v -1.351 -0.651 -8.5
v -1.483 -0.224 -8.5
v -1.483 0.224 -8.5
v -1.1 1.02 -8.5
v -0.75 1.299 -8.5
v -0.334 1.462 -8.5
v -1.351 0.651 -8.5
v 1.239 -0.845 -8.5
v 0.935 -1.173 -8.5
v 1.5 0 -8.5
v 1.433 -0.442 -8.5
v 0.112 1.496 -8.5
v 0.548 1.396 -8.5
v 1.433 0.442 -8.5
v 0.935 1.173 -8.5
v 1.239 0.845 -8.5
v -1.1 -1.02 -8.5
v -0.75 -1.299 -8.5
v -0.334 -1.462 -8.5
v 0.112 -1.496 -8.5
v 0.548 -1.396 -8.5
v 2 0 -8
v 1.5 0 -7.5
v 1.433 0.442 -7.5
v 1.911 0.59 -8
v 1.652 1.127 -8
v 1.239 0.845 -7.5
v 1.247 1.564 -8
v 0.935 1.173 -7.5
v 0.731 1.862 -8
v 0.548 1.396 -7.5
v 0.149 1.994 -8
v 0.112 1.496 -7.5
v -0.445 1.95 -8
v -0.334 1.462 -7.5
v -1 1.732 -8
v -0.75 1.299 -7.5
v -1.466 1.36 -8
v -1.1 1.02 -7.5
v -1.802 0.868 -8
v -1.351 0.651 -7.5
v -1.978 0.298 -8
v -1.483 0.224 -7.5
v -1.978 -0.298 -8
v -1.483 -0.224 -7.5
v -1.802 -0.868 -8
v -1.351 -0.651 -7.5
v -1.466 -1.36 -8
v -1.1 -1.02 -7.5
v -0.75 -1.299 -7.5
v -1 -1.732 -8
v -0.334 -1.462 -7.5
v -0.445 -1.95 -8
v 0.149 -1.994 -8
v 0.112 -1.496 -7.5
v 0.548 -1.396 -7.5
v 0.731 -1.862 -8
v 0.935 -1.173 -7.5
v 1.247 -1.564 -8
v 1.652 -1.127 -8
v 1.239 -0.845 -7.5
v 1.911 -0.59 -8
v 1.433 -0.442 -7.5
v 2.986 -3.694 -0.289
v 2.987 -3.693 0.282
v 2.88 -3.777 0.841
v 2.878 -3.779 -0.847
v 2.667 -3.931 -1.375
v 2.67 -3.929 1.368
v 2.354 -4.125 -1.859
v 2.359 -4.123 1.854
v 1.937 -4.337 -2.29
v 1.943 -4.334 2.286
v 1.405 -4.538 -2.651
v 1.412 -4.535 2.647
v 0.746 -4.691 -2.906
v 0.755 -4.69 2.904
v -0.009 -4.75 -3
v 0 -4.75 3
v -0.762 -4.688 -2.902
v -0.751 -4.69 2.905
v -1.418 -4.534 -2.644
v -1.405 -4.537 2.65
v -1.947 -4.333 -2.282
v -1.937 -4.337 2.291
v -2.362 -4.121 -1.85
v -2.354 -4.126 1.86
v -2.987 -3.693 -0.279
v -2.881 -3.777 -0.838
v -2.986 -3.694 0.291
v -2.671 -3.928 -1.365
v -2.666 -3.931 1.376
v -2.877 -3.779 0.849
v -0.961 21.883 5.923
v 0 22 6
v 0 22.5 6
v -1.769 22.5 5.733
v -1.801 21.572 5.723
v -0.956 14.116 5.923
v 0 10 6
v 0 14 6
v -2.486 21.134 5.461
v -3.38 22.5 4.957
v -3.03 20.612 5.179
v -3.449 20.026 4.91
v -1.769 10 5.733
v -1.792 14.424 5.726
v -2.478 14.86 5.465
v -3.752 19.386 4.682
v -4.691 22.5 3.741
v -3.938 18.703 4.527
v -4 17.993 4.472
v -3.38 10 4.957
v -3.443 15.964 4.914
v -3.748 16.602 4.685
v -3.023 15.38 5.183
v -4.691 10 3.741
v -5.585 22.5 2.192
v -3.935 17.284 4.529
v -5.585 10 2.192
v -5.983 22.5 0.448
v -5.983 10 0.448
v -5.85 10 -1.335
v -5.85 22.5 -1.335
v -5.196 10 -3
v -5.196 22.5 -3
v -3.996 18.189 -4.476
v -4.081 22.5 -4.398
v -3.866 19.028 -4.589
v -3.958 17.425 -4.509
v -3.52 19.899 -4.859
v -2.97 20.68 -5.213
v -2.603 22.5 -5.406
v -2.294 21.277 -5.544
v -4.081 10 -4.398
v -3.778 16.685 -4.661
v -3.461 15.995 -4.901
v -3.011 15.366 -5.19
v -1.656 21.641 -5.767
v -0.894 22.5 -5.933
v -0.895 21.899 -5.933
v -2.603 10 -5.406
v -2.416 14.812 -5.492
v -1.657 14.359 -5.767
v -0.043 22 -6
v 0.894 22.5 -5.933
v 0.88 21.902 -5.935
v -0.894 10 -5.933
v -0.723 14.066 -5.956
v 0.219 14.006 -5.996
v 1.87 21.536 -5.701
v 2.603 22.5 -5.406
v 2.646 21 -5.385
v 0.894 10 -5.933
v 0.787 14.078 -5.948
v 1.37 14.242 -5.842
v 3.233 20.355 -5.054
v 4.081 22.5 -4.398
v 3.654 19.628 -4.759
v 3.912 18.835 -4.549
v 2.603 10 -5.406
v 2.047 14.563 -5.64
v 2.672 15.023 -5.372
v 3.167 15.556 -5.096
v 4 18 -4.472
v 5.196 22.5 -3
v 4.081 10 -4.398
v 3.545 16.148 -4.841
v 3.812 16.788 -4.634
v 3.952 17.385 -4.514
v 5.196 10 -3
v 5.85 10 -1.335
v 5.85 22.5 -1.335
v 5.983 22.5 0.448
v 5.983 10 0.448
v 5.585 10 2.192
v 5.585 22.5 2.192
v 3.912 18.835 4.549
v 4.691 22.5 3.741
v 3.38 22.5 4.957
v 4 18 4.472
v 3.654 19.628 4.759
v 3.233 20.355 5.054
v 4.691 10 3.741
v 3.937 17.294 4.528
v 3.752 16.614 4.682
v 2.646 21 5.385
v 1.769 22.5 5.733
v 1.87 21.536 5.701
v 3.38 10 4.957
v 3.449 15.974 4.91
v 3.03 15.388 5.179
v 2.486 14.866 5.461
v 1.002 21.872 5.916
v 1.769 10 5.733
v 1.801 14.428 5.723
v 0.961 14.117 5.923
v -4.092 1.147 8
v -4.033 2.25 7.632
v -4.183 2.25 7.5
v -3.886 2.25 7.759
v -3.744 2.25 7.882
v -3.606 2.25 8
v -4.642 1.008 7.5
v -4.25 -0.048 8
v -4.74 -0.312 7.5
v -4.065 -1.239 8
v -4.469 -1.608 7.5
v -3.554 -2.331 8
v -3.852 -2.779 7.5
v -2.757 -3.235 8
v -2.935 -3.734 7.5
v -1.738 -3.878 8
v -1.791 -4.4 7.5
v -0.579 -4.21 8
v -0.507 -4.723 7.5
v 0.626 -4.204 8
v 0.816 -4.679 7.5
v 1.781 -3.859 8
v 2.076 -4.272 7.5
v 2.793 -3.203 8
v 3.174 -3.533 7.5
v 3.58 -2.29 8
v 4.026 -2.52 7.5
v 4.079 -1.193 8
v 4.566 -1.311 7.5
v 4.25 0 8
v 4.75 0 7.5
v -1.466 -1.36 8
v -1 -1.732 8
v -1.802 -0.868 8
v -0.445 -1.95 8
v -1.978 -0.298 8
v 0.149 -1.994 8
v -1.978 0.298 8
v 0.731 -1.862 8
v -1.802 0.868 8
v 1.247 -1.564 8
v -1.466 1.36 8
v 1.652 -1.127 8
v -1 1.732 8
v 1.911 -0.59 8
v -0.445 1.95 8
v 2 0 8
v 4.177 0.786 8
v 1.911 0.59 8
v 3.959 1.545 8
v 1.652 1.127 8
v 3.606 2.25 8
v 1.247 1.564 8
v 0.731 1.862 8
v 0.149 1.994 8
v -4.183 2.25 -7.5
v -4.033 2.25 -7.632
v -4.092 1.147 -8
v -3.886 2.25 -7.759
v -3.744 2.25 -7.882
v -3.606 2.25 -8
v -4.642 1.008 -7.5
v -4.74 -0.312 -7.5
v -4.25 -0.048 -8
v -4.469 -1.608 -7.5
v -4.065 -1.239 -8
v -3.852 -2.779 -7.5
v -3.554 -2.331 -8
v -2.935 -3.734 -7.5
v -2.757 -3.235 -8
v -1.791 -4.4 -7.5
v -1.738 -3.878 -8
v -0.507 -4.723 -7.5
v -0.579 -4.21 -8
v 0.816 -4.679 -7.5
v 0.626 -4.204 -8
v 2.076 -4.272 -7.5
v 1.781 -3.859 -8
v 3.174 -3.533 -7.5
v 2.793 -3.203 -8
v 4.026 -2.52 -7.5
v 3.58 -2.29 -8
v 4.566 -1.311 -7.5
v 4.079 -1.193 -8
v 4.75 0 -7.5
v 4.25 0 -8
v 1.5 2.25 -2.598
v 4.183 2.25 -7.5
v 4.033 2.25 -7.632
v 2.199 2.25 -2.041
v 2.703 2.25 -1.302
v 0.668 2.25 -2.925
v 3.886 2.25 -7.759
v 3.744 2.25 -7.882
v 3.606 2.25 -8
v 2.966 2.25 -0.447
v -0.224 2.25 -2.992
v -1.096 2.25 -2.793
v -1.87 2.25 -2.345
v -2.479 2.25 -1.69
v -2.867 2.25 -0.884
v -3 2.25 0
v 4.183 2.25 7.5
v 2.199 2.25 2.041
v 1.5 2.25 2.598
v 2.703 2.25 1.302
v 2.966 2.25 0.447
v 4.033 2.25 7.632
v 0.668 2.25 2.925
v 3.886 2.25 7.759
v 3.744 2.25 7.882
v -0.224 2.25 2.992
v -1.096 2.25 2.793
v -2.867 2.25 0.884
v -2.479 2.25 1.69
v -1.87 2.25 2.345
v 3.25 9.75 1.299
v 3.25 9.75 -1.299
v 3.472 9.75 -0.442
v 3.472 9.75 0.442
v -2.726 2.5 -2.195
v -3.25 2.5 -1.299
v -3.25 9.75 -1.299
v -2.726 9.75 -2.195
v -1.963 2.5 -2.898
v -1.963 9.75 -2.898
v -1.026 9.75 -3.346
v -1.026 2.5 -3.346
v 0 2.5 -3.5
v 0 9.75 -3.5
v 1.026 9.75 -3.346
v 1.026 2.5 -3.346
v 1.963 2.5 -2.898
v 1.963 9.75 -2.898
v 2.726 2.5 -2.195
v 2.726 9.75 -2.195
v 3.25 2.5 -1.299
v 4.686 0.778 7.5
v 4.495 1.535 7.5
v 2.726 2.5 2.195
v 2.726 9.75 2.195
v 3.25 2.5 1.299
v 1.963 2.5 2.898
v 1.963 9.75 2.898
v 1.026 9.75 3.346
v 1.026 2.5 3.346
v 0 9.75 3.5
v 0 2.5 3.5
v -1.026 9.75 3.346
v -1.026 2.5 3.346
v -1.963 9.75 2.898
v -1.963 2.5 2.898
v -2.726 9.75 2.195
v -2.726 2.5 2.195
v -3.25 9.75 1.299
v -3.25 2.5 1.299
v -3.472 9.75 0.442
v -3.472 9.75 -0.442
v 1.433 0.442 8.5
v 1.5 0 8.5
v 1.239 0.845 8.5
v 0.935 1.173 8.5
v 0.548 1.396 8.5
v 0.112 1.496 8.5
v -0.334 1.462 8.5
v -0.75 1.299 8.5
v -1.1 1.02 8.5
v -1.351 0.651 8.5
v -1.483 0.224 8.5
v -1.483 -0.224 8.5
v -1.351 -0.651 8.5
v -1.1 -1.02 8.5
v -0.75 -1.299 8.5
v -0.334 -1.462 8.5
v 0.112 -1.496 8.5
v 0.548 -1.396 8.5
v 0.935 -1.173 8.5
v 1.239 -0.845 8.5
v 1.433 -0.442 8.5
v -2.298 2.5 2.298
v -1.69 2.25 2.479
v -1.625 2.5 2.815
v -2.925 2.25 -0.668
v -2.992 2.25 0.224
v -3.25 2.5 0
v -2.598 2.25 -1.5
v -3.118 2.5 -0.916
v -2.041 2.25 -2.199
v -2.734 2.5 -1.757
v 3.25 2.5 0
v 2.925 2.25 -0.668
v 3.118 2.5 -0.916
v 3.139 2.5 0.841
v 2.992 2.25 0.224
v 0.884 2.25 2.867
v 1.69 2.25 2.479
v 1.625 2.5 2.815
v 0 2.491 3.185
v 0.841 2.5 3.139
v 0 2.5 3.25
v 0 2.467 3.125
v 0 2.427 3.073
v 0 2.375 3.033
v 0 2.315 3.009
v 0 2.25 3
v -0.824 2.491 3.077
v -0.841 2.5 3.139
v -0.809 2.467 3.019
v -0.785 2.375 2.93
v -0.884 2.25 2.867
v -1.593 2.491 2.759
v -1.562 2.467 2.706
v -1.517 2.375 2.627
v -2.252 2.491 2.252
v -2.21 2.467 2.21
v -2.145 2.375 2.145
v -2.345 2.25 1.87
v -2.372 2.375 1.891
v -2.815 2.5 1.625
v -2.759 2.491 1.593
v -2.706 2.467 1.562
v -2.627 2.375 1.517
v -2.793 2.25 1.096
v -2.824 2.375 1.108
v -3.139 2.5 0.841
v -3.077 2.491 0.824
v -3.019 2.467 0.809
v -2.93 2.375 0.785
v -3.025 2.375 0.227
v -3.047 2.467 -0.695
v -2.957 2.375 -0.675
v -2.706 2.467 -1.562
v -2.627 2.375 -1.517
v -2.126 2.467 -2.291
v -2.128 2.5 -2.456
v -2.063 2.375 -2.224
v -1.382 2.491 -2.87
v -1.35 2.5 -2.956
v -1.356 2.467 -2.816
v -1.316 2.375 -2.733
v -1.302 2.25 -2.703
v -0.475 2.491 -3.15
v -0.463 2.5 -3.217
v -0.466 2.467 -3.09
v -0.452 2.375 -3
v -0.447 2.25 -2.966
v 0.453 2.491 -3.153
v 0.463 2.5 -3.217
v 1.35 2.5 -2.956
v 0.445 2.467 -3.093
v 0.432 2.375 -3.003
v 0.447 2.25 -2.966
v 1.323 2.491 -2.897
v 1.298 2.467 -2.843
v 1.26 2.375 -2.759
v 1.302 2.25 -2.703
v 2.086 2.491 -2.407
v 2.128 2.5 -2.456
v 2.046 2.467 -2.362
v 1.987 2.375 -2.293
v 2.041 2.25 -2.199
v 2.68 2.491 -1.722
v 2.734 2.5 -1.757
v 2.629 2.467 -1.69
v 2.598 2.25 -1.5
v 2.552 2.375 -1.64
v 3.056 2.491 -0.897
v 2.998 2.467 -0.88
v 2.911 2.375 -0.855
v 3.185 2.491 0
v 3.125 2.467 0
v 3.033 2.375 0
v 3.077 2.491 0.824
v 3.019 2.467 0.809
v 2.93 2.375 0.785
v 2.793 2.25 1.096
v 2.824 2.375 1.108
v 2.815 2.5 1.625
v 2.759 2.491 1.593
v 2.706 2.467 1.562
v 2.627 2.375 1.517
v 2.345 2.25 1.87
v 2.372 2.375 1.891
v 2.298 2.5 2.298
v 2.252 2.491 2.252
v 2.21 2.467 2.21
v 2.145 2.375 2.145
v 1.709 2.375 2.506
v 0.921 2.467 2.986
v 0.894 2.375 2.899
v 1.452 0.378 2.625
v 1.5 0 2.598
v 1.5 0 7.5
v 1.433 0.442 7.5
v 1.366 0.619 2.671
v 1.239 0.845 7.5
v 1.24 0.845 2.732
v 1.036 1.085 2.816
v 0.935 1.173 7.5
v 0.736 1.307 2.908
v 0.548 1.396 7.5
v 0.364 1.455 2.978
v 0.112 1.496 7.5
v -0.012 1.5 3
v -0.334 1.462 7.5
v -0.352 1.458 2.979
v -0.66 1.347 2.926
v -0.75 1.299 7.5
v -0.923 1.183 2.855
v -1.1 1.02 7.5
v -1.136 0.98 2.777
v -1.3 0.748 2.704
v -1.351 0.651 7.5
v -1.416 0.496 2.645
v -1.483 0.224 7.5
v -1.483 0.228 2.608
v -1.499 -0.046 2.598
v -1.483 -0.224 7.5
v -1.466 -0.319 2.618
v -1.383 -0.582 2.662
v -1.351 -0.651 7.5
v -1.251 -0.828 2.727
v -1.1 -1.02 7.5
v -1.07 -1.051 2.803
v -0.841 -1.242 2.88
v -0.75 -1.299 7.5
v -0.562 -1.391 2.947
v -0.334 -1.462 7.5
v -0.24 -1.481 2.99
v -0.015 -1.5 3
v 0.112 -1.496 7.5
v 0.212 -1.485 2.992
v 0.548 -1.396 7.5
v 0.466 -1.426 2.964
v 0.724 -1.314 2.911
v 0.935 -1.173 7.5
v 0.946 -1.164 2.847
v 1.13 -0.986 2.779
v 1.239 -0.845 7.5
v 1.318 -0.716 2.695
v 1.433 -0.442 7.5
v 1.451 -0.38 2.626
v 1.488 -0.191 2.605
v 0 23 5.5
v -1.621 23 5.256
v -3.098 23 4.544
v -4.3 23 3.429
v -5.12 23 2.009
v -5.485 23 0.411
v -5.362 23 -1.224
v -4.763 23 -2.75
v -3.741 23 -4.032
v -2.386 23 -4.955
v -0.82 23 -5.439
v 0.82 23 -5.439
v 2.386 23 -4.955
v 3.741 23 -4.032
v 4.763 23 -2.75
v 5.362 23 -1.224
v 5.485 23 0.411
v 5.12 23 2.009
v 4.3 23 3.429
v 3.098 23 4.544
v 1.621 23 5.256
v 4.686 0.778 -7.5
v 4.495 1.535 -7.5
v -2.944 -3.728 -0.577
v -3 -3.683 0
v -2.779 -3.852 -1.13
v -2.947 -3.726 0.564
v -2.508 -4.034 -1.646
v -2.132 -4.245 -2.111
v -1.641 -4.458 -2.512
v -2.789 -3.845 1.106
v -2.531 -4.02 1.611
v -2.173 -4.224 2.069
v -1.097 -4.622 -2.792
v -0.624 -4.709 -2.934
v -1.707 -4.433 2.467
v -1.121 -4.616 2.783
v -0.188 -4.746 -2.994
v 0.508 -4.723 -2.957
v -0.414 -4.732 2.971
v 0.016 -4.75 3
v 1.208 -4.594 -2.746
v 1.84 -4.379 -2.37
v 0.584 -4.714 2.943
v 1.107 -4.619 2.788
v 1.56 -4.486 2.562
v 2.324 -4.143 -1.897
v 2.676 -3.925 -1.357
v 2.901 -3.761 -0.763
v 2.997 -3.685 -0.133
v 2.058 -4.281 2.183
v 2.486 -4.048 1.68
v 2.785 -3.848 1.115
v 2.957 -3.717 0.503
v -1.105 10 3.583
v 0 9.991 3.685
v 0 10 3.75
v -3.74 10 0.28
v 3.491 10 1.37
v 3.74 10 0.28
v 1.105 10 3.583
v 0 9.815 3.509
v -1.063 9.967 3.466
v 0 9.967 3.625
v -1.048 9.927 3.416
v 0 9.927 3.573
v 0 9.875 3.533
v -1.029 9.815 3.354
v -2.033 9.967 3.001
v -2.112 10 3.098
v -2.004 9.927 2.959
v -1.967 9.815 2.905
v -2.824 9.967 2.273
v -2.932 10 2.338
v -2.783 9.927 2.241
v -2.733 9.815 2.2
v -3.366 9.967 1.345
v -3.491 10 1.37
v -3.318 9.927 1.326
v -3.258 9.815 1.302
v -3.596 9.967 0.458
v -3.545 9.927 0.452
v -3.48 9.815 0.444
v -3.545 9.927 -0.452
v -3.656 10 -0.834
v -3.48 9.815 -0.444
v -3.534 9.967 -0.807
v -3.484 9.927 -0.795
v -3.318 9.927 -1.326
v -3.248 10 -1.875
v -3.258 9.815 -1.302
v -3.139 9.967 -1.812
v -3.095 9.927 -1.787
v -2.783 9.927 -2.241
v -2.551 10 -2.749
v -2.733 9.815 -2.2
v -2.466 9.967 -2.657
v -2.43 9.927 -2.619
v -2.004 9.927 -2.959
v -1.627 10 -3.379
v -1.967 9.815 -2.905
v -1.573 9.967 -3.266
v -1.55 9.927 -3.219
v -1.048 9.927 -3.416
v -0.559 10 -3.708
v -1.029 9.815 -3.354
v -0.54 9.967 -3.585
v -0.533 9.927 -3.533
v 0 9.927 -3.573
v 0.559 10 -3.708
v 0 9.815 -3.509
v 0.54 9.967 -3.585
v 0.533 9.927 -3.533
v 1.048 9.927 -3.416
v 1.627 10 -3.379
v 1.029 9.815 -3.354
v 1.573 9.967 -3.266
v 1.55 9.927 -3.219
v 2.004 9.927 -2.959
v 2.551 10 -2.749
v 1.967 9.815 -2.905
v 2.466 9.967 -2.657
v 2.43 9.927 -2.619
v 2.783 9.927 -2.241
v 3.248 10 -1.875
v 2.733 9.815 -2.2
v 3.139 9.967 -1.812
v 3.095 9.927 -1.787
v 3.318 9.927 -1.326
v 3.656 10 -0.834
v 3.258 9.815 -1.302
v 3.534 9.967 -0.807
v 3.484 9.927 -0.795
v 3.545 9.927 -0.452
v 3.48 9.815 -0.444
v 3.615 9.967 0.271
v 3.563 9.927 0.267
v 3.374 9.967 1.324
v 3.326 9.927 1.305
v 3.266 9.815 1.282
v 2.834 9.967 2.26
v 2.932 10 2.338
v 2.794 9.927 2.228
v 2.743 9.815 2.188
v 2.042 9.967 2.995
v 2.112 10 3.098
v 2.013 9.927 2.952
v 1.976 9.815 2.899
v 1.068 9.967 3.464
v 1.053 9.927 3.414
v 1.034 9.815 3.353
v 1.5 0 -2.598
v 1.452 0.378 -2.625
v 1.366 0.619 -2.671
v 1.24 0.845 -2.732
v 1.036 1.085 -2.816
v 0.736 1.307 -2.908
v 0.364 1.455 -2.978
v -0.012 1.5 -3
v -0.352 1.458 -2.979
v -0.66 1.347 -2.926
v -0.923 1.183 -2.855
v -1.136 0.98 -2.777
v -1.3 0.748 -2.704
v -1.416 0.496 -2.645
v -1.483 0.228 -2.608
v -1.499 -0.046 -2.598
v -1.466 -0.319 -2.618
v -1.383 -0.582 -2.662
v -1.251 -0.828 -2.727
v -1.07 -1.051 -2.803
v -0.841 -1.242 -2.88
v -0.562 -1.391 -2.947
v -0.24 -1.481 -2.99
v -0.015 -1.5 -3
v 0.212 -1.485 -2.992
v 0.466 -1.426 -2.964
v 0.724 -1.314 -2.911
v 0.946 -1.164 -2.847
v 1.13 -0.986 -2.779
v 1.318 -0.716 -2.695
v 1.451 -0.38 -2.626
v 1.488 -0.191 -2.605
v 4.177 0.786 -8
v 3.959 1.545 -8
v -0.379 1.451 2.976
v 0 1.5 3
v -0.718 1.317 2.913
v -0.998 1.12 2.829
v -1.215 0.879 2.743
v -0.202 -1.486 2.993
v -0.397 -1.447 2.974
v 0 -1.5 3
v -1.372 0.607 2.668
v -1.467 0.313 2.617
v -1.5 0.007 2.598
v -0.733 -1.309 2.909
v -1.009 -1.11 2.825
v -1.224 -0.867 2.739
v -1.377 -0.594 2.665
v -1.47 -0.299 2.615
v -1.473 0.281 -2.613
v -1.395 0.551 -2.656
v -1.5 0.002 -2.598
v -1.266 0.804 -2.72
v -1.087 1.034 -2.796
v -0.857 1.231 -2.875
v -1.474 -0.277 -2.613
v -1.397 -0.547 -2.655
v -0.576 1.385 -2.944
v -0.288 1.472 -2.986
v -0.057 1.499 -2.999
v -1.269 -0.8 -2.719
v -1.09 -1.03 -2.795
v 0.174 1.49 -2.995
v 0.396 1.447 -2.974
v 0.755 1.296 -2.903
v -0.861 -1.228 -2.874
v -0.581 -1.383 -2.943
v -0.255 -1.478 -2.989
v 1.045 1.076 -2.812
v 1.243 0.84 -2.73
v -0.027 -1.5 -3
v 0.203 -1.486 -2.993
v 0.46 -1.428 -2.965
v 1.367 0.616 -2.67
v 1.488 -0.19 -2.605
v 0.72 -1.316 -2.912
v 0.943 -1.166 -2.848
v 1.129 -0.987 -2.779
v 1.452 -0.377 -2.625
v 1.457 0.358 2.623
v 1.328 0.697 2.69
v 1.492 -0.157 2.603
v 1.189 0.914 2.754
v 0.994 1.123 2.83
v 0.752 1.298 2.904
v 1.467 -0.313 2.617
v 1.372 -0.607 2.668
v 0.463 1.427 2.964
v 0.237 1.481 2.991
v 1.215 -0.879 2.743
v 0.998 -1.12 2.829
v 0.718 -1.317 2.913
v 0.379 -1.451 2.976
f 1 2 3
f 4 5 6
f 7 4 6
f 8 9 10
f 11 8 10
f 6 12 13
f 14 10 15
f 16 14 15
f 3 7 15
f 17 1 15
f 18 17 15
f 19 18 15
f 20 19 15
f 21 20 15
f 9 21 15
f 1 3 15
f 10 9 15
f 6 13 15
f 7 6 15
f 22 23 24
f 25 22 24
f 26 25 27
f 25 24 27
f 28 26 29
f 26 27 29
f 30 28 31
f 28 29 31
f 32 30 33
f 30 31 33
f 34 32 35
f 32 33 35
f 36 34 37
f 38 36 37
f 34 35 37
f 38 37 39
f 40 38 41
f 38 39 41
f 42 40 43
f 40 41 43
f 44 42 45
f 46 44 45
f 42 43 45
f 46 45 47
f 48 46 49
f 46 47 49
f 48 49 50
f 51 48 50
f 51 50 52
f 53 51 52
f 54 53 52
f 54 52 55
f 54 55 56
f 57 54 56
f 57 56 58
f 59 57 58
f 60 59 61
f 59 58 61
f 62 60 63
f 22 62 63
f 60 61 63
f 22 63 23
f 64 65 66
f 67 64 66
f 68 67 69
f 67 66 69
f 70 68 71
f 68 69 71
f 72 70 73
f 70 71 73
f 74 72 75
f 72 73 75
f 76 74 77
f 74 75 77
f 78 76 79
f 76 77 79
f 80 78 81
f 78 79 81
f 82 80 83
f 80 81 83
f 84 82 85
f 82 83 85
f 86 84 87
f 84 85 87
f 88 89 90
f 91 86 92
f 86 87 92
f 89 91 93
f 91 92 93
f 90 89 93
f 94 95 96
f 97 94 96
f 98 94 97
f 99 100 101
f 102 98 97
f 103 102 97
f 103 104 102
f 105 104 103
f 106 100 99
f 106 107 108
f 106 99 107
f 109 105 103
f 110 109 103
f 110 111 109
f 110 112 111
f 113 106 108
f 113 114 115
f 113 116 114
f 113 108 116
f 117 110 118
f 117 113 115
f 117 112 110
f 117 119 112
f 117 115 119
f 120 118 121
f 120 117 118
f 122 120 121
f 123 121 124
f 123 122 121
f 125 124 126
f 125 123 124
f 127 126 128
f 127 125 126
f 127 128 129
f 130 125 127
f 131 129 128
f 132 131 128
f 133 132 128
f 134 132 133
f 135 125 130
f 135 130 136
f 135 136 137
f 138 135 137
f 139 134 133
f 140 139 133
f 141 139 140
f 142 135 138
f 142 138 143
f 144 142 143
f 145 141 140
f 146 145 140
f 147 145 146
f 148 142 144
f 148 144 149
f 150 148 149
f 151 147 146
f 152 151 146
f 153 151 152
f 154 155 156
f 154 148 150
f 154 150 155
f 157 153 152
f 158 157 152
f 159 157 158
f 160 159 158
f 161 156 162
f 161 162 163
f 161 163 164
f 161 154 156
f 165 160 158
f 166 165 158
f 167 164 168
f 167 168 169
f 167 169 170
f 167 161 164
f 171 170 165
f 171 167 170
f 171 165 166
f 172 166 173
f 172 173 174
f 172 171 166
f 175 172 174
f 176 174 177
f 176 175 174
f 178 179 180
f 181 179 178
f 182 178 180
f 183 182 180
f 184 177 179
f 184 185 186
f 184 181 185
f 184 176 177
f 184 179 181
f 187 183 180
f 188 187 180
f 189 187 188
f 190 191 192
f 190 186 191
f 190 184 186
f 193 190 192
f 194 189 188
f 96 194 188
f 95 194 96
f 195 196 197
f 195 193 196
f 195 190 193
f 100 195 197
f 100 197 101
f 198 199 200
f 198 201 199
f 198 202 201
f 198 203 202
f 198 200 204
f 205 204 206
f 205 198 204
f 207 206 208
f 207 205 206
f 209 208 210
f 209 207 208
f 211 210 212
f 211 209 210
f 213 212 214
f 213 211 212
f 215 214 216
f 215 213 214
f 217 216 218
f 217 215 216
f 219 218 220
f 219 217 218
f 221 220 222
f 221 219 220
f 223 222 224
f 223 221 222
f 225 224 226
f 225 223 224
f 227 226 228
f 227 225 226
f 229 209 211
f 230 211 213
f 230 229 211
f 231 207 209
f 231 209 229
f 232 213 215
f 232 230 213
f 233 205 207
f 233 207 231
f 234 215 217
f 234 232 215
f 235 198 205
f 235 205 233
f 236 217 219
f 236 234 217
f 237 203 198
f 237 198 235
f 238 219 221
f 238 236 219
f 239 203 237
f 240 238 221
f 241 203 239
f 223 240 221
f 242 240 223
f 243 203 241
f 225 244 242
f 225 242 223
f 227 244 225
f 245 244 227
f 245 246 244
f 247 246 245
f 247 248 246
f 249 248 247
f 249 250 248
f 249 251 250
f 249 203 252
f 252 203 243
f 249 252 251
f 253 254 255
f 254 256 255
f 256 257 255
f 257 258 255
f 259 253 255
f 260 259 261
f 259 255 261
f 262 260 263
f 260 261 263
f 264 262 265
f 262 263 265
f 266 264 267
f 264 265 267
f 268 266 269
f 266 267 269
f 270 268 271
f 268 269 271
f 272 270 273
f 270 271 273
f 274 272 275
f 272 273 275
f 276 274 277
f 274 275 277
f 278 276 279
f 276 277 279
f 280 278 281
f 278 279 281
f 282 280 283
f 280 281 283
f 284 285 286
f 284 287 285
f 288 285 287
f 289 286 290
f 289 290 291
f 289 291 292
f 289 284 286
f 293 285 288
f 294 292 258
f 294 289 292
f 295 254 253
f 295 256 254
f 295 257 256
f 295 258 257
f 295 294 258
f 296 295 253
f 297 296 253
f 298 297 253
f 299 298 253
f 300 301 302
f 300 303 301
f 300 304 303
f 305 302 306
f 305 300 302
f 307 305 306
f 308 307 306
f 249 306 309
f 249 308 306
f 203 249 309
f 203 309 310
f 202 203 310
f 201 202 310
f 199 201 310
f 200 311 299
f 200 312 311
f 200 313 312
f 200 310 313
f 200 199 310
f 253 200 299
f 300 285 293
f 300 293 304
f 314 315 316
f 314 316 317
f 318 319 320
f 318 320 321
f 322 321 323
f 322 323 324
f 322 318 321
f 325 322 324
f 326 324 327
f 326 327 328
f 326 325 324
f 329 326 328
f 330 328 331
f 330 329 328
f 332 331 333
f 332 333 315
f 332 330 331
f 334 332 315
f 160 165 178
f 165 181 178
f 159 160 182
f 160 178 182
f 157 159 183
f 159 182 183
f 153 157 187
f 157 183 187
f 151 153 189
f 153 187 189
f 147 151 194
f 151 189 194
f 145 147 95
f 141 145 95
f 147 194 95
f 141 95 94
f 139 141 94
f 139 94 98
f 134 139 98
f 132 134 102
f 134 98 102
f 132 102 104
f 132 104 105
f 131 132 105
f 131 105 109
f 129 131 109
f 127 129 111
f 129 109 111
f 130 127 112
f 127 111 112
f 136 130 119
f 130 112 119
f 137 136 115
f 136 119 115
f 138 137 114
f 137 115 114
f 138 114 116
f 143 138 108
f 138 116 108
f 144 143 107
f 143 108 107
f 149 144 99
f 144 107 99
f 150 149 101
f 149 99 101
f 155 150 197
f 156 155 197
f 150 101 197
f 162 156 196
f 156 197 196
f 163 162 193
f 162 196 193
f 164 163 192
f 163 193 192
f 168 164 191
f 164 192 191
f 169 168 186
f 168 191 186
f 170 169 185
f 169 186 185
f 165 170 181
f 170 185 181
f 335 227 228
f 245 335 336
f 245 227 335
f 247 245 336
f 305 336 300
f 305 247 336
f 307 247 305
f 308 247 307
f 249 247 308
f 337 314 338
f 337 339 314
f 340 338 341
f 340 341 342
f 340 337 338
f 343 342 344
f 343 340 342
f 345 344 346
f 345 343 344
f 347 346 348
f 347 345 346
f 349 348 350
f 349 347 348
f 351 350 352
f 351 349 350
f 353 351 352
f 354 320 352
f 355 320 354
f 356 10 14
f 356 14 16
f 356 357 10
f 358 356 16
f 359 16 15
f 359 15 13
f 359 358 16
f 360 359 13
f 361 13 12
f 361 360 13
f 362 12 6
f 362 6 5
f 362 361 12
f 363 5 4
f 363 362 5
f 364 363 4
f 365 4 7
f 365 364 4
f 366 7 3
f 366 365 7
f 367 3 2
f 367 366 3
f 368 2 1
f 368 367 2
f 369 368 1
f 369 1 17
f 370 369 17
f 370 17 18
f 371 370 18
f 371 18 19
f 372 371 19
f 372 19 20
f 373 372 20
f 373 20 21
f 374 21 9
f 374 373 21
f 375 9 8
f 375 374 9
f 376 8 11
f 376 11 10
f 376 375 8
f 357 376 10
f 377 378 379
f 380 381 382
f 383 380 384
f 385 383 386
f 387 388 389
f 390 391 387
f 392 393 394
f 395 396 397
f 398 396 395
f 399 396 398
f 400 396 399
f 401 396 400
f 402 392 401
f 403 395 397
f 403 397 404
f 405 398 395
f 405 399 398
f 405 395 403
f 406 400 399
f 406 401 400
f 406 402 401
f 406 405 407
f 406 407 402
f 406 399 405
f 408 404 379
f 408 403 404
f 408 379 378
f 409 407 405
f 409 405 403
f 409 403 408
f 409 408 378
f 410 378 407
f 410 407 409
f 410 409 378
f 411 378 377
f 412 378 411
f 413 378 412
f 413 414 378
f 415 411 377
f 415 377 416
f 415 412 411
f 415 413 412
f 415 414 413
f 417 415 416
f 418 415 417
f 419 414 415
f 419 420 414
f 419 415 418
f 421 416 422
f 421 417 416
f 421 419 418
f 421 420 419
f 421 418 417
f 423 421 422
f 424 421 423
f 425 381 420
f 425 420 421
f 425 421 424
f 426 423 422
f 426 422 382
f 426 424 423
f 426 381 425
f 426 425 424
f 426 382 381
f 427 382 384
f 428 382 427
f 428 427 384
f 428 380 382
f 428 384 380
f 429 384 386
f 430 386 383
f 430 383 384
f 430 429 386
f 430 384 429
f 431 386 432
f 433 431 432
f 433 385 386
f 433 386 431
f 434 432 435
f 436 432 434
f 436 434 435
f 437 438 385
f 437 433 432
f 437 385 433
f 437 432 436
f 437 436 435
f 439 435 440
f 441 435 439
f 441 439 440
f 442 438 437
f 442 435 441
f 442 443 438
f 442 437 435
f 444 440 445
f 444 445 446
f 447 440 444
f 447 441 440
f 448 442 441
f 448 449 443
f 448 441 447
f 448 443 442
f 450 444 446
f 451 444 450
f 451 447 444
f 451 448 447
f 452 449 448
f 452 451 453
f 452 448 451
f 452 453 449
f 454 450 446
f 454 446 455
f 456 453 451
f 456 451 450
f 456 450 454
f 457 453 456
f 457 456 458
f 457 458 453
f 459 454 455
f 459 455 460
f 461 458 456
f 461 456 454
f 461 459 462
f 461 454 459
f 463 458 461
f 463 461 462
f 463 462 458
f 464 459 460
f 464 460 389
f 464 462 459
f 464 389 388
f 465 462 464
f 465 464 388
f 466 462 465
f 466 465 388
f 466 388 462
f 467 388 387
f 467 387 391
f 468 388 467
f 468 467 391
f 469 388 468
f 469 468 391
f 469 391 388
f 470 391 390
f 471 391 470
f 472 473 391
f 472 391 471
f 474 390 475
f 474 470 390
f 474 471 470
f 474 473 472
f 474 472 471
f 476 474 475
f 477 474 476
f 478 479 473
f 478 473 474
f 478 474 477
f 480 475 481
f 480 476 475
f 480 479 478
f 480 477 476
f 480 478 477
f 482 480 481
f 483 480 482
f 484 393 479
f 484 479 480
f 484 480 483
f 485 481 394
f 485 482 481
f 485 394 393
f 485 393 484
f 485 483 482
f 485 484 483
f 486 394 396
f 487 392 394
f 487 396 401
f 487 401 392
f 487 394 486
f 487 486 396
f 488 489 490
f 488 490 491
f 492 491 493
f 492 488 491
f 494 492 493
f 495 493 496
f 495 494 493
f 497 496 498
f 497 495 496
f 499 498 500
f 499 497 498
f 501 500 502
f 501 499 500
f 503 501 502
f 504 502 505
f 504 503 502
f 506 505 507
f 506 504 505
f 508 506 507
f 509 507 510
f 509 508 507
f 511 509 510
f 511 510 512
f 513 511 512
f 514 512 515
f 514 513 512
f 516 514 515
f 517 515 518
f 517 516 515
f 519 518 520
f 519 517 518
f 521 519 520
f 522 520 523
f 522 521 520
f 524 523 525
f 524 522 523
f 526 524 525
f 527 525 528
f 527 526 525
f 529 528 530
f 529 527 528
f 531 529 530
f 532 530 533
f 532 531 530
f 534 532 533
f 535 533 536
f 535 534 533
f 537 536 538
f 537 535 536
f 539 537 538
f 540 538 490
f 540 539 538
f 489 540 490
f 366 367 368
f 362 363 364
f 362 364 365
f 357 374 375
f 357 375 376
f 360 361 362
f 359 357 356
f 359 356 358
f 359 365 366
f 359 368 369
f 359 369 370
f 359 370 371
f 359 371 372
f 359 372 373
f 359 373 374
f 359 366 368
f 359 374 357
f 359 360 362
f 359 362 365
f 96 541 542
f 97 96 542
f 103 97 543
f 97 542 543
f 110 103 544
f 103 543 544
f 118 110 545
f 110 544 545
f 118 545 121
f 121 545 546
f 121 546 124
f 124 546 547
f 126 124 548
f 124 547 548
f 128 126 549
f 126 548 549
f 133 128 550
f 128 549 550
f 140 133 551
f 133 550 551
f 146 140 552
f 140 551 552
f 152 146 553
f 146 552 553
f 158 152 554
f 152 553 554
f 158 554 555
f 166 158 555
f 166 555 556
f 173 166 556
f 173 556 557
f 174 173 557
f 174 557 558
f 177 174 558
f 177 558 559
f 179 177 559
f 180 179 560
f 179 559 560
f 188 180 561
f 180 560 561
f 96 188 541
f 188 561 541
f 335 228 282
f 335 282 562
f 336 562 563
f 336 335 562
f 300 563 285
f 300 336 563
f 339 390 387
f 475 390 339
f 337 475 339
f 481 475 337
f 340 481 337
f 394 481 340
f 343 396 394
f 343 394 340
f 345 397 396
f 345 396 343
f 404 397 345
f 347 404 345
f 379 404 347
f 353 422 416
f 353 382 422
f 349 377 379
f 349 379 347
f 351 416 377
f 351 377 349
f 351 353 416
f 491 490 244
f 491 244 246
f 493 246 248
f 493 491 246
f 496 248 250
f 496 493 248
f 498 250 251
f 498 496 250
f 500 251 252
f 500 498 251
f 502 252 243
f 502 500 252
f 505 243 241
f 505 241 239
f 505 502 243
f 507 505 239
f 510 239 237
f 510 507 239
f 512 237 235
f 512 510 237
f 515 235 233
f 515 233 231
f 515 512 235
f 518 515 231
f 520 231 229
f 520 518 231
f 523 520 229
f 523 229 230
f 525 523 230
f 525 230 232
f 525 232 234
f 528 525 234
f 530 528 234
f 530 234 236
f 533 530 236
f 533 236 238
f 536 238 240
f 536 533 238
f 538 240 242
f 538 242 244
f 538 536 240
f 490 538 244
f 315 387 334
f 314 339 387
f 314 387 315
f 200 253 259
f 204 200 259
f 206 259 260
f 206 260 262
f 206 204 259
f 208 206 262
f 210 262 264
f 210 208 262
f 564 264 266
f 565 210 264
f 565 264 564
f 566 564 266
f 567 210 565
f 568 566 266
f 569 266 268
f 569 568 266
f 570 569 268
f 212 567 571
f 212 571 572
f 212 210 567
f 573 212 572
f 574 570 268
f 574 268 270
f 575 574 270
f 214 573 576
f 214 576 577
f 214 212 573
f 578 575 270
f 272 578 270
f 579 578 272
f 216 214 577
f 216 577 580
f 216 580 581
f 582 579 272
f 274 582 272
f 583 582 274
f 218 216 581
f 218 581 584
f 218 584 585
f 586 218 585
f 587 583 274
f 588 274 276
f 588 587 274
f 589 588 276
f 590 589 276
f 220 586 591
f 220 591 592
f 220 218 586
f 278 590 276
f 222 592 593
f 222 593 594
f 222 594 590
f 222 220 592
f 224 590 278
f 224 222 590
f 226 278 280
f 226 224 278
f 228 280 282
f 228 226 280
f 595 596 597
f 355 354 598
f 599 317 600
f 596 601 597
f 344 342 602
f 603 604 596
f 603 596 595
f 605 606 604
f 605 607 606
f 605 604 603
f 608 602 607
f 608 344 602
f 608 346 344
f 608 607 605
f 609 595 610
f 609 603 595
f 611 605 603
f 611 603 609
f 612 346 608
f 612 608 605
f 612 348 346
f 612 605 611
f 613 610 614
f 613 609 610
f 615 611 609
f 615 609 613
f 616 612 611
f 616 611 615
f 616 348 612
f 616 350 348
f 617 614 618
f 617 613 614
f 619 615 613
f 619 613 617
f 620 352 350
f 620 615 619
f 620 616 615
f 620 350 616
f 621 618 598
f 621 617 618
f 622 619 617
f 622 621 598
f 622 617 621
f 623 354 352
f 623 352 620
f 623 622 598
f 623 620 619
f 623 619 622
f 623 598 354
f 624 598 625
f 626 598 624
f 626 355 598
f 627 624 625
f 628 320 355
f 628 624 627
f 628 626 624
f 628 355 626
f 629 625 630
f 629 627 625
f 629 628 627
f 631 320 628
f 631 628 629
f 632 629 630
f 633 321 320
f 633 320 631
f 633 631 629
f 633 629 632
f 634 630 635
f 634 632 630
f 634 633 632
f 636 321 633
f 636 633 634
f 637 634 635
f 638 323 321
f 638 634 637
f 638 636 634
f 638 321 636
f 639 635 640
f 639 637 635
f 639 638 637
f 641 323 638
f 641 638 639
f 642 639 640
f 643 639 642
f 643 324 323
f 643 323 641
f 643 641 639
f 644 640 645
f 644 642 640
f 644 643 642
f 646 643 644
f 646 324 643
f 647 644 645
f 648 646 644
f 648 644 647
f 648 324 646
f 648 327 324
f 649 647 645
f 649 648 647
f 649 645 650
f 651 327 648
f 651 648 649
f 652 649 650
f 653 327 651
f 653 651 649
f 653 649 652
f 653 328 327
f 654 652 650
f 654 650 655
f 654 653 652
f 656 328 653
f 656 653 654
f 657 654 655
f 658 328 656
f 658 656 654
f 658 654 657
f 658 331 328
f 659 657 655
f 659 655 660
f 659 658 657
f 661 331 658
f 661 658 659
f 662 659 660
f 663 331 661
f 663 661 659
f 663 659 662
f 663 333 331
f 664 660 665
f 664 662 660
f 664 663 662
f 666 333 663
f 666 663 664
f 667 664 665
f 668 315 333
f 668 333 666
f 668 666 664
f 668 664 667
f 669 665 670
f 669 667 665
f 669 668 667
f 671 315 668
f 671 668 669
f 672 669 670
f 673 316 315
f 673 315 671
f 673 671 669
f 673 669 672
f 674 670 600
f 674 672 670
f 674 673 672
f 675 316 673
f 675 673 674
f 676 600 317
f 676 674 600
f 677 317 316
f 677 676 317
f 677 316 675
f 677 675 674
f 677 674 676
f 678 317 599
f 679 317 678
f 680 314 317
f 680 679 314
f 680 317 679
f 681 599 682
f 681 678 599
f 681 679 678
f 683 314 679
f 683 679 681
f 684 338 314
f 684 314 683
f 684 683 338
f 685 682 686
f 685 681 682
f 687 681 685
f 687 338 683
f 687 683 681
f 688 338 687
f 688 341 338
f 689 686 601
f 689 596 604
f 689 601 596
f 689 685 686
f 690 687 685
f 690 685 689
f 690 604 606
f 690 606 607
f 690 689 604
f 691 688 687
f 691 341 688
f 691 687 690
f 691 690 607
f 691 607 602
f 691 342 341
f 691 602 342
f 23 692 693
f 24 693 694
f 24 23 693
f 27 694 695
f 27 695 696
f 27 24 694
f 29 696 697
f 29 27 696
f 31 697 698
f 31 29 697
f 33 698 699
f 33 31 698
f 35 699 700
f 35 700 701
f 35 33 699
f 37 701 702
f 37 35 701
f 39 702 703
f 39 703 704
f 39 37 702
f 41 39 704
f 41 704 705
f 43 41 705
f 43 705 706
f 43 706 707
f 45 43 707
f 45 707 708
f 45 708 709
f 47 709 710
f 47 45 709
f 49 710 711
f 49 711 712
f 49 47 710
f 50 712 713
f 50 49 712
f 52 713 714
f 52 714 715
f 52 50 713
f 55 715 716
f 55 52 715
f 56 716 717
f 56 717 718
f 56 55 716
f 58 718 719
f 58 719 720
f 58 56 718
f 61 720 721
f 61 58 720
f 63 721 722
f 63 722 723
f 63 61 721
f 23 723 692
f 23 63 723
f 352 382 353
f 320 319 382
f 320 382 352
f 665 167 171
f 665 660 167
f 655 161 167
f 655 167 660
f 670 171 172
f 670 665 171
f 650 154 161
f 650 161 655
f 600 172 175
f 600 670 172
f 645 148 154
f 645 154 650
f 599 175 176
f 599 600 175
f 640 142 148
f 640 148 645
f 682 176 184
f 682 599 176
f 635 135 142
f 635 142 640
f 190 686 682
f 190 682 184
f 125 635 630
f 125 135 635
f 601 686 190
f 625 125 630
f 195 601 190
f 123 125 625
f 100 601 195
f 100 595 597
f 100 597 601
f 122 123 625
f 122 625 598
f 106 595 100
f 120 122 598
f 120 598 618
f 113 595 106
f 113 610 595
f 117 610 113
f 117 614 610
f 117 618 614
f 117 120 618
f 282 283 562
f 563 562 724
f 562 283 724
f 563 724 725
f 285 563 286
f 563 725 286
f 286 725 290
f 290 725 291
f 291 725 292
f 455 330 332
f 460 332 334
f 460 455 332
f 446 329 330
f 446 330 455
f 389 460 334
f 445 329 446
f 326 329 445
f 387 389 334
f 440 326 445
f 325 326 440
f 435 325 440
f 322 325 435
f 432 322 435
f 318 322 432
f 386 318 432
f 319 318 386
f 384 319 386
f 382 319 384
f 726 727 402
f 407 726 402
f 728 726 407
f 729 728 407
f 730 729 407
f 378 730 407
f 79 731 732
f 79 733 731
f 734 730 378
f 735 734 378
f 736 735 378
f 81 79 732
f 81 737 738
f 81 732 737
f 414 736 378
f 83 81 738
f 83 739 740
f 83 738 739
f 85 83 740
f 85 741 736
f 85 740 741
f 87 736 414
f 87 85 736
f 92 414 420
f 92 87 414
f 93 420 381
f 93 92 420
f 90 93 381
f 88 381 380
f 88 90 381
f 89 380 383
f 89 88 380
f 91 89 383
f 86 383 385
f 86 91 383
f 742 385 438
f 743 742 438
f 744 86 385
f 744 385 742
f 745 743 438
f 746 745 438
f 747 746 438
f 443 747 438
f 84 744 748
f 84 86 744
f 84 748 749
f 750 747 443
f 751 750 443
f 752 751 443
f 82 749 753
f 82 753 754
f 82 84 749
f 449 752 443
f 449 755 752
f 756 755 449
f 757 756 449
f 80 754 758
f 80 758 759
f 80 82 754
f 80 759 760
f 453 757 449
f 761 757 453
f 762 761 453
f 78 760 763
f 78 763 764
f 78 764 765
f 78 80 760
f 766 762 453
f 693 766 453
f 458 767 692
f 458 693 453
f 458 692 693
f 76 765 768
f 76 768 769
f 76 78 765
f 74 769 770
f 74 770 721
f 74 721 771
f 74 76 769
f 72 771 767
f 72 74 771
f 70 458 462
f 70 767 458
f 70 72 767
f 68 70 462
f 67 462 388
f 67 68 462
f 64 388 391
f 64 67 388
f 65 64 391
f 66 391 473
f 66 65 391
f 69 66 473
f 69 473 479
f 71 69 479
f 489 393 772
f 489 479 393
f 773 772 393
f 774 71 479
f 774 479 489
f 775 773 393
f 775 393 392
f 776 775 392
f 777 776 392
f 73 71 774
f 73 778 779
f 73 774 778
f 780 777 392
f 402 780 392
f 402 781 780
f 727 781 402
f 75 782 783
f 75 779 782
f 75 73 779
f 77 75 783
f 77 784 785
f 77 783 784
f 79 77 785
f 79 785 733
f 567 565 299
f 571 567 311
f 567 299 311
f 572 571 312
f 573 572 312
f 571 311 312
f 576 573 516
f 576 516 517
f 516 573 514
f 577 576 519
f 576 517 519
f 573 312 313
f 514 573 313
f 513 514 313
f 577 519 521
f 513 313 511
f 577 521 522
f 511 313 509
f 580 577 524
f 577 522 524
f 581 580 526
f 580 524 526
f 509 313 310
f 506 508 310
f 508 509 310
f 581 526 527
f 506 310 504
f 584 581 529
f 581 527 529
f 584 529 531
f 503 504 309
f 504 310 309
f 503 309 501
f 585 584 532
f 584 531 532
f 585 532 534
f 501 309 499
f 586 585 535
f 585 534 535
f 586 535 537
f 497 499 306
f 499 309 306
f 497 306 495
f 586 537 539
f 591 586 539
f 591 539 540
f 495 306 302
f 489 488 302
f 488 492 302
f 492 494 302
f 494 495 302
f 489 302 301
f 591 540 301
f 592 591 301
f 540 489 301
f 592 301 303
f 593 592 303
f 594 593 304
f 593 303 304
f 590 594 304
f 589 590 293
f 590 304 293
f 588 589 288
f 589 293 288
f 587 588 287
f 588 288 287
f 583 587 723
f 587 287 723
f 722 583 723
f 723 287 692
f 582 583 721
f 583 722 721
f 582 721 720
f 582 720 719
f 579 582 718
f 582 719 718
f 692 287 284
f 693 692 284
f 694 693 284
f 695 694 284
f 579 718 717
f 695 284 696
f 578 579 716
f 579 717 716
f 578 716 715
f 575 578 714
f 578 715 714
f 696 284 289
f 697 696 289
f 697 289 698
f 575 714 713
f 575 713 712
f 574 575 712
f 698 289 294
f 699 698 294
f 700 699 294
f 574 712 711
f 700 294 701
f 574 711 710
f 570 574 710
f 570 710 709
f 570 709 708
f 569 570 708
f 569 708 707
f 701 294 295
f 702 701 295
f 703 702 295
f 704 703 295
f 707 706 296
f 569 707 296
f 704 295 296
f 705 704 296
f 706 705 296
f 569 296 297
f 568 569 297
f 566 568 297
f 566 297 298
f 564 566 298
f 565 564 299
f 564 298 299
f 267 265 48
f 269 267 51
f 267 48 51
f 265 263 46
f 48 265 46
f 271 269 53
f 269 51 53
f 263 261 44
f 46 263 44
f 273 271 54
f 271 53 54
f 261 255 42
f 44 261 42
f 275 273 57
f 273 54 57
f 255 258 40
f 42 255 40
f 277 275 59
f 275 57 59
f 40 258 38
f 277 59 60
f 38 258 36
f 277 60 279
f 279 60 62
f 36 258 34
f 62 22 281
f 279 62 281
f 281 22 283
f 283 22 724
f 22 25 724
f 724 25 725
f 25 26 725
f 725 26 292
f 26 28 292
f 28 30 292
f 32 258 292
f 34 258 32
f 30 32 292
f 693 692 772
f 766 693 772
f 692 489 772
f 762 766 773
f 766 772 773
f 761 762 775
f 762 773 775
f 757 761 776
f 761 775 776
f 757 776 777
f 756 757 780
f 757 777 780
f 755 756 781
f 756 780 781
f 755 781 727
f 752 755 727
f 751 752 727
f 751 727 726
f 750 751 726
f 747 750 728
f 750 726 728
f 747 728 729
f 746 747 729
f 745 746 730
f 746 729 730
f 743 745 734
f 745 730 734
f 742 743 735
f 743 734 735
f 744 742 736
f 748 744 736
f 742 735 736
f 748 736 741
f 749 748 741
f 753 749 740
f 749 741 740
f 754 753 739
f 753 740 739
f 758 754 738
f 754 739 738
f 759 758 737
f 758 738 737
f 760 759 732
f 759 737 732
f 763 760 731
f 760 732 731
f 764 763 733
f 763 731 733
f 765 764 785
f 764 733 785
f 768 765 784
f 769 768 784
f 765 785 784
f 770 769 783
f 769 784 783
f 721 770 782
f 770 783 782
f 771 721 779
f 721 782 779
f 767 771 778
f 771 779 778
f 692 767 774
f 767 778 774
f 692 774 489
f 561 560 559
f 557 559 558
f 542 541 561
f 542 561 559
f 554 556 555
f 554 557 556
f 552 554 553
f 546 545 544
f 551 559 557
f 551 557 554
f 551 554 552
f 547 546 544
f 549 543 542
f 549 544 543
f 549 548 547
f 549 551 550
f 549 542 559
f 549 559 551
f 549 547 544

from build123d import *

# Parameters (mm, degrees)
F0_R      = 1.5
F1_DEPTH  = 8
F2_SIZE   = 0.5
F3_R      = 3
F4_DEPTH  = 7.001
F7_W      = 4.25
F7_H      = 7.25
F8_DEPTH  = 12.5
F9_R      = 1.5
F10_DEPTH = 12.5
F12_DEPTH = 12.5
F13_R     = 4
F14_DEPTH = 12.5
F15_SIZE  = 0.5
F16_R     = 1.5
F17_DEPTH = 8.5
F18_SIZE  = 0.5


with BuildPart() as f1:
    # F0 (on Top) → F1 (new body, symmetric)
    with BuildSketch(Plane.XY):
        with BuildLine():
            ThreePointArc((-4.1833001327, 2.25), (-1.1601345547, -4.6061467427), (4.75, 0))
            ThreePointArc((4.75, 0), (4.6061467427, 1.1601345547), (4.1833001327, 2.25))
            Line((4.1833001327, 2.25), (-4.1833001327, 2.25))
        make_face()
        Circle(F0_R, mode=Mode.SUBTRACT)
    extrude(amount=F1_DEPTH, both=True)

    # F2
    f2_edges = [f1.edges().sort_by_distance(p)[0] for p in [
        (0, -4.75, 8),
        (0, -4.75, -8),
    ]]
    chamfer(f2_edges, length=F2_SIZE)

    # F3 (on face) → F4 (cut, through all)
    with BuildSketch(Plane(origin=(0, 2.25, 0), x_dir=(-1, 0, 0), z_dir=(0, 1, 0))):
        Circle(F3_R)
    extrude(amount=-F4_DEPTH, mode=Mode.SUBTRACT)

    # F18
    f18_edges = [f1.edges().sort_by_distance(p)[0] for p in [
        (-1.5, 0, 8),
        (-1.5, 0, -8),
    ]]
    chamfer(f18_edges, length=F18_SIZE)


with BuildPart() as f6:
    # F5 (on Right) → F6 (revolve)
    with BuildSketch(Plane.YZ):
        with BuildLine():
            Line((-5, 3), (-5, 0))
            Line((-5, 0), (23, 0))
            Line((23, 0), (23, 6))
            Line((23, 6), (10, 6))
            Line((10, 6), (10, 3.75))
            ThreePointArc((10, 3.75), (9.9267766953, 3.5732233047), (9.75, 3.5))
            Line((9.75, 3.5), (2.5, 3.5))
            Line((2.5, 3.5), (2.5, 3.25))
            ThreePointArc((2.5, 3.25), (2.4267766953, 3.0732233047), (2.25, 3))
            Line((2.25, 3), (-5, 3))
        make_face()
    revolve(axis=Axis((0, 9, 0), (0, -1, 0)))

    # F7 (on Top) → F8 (cut, symmetric)
    with BuildSketch(Plane.XY):
        with Locations((-5.375, 6.125)):
            Rectangle(F7_W, F7_H)
        with Locations((5.375, 6.125)):
            Rectangle(F7_W, F7_H)
    extrude(amount=F8_DEPTH, both=True, mode=Mode.SUBTRACT)

    # F9 (on Top) → F10 (cut, symmetric)
    with BuildSketch(Plane.XY):
        Circle(F9_R)
    extrude(amount=F10_DEPTH, both=True, mode=Mode.SUBTRACT)

    # F11 (on Top) → F12 (cut, symmetric)
    with BuildSketch(Plane.XY):
        with BuildLine():
            ThreePointArc((3, -3.6827299657), (0, -4.75), (-3, -3.6827299657))
            Line((-3, -3.6827299657), (-3, -5.6827299657))
            Line((-3, -5.6827299657), (3, -5.6827299657))
            Line((3, -5.6827299657), (3, -3.6827299657))
        make_face()
    extrude(amount=F12_DEPTH, both=True, mode=Mode.SUBTRACT)

    # F13 (on Top) → F14 (cut, symmetric)
    with BuildSketch(Plane.XY):
        with Locations((0, 18)):
            Circle(F13_R)
    extrude(amount=F14_DEPTH, both=True, mode=Mode.SUBTRACT)

    # F15
    f15_edges = [f6.edges().sort_by_distance(p)[0] for p in [
        (0, 23, -6),
    ]]
    chamfer(f15_edges, length=F15_SIZE)


with BuildPart() as f17:
    # F16 (on Top) → F17 (new body, symmetric)
    with BuildSketch(Plane.XY):
        Circle(F16_R)
    extrude(amount=F17_DEPTH, both=True)


solid = Compound([f1.part, f6.part, f17.part])
